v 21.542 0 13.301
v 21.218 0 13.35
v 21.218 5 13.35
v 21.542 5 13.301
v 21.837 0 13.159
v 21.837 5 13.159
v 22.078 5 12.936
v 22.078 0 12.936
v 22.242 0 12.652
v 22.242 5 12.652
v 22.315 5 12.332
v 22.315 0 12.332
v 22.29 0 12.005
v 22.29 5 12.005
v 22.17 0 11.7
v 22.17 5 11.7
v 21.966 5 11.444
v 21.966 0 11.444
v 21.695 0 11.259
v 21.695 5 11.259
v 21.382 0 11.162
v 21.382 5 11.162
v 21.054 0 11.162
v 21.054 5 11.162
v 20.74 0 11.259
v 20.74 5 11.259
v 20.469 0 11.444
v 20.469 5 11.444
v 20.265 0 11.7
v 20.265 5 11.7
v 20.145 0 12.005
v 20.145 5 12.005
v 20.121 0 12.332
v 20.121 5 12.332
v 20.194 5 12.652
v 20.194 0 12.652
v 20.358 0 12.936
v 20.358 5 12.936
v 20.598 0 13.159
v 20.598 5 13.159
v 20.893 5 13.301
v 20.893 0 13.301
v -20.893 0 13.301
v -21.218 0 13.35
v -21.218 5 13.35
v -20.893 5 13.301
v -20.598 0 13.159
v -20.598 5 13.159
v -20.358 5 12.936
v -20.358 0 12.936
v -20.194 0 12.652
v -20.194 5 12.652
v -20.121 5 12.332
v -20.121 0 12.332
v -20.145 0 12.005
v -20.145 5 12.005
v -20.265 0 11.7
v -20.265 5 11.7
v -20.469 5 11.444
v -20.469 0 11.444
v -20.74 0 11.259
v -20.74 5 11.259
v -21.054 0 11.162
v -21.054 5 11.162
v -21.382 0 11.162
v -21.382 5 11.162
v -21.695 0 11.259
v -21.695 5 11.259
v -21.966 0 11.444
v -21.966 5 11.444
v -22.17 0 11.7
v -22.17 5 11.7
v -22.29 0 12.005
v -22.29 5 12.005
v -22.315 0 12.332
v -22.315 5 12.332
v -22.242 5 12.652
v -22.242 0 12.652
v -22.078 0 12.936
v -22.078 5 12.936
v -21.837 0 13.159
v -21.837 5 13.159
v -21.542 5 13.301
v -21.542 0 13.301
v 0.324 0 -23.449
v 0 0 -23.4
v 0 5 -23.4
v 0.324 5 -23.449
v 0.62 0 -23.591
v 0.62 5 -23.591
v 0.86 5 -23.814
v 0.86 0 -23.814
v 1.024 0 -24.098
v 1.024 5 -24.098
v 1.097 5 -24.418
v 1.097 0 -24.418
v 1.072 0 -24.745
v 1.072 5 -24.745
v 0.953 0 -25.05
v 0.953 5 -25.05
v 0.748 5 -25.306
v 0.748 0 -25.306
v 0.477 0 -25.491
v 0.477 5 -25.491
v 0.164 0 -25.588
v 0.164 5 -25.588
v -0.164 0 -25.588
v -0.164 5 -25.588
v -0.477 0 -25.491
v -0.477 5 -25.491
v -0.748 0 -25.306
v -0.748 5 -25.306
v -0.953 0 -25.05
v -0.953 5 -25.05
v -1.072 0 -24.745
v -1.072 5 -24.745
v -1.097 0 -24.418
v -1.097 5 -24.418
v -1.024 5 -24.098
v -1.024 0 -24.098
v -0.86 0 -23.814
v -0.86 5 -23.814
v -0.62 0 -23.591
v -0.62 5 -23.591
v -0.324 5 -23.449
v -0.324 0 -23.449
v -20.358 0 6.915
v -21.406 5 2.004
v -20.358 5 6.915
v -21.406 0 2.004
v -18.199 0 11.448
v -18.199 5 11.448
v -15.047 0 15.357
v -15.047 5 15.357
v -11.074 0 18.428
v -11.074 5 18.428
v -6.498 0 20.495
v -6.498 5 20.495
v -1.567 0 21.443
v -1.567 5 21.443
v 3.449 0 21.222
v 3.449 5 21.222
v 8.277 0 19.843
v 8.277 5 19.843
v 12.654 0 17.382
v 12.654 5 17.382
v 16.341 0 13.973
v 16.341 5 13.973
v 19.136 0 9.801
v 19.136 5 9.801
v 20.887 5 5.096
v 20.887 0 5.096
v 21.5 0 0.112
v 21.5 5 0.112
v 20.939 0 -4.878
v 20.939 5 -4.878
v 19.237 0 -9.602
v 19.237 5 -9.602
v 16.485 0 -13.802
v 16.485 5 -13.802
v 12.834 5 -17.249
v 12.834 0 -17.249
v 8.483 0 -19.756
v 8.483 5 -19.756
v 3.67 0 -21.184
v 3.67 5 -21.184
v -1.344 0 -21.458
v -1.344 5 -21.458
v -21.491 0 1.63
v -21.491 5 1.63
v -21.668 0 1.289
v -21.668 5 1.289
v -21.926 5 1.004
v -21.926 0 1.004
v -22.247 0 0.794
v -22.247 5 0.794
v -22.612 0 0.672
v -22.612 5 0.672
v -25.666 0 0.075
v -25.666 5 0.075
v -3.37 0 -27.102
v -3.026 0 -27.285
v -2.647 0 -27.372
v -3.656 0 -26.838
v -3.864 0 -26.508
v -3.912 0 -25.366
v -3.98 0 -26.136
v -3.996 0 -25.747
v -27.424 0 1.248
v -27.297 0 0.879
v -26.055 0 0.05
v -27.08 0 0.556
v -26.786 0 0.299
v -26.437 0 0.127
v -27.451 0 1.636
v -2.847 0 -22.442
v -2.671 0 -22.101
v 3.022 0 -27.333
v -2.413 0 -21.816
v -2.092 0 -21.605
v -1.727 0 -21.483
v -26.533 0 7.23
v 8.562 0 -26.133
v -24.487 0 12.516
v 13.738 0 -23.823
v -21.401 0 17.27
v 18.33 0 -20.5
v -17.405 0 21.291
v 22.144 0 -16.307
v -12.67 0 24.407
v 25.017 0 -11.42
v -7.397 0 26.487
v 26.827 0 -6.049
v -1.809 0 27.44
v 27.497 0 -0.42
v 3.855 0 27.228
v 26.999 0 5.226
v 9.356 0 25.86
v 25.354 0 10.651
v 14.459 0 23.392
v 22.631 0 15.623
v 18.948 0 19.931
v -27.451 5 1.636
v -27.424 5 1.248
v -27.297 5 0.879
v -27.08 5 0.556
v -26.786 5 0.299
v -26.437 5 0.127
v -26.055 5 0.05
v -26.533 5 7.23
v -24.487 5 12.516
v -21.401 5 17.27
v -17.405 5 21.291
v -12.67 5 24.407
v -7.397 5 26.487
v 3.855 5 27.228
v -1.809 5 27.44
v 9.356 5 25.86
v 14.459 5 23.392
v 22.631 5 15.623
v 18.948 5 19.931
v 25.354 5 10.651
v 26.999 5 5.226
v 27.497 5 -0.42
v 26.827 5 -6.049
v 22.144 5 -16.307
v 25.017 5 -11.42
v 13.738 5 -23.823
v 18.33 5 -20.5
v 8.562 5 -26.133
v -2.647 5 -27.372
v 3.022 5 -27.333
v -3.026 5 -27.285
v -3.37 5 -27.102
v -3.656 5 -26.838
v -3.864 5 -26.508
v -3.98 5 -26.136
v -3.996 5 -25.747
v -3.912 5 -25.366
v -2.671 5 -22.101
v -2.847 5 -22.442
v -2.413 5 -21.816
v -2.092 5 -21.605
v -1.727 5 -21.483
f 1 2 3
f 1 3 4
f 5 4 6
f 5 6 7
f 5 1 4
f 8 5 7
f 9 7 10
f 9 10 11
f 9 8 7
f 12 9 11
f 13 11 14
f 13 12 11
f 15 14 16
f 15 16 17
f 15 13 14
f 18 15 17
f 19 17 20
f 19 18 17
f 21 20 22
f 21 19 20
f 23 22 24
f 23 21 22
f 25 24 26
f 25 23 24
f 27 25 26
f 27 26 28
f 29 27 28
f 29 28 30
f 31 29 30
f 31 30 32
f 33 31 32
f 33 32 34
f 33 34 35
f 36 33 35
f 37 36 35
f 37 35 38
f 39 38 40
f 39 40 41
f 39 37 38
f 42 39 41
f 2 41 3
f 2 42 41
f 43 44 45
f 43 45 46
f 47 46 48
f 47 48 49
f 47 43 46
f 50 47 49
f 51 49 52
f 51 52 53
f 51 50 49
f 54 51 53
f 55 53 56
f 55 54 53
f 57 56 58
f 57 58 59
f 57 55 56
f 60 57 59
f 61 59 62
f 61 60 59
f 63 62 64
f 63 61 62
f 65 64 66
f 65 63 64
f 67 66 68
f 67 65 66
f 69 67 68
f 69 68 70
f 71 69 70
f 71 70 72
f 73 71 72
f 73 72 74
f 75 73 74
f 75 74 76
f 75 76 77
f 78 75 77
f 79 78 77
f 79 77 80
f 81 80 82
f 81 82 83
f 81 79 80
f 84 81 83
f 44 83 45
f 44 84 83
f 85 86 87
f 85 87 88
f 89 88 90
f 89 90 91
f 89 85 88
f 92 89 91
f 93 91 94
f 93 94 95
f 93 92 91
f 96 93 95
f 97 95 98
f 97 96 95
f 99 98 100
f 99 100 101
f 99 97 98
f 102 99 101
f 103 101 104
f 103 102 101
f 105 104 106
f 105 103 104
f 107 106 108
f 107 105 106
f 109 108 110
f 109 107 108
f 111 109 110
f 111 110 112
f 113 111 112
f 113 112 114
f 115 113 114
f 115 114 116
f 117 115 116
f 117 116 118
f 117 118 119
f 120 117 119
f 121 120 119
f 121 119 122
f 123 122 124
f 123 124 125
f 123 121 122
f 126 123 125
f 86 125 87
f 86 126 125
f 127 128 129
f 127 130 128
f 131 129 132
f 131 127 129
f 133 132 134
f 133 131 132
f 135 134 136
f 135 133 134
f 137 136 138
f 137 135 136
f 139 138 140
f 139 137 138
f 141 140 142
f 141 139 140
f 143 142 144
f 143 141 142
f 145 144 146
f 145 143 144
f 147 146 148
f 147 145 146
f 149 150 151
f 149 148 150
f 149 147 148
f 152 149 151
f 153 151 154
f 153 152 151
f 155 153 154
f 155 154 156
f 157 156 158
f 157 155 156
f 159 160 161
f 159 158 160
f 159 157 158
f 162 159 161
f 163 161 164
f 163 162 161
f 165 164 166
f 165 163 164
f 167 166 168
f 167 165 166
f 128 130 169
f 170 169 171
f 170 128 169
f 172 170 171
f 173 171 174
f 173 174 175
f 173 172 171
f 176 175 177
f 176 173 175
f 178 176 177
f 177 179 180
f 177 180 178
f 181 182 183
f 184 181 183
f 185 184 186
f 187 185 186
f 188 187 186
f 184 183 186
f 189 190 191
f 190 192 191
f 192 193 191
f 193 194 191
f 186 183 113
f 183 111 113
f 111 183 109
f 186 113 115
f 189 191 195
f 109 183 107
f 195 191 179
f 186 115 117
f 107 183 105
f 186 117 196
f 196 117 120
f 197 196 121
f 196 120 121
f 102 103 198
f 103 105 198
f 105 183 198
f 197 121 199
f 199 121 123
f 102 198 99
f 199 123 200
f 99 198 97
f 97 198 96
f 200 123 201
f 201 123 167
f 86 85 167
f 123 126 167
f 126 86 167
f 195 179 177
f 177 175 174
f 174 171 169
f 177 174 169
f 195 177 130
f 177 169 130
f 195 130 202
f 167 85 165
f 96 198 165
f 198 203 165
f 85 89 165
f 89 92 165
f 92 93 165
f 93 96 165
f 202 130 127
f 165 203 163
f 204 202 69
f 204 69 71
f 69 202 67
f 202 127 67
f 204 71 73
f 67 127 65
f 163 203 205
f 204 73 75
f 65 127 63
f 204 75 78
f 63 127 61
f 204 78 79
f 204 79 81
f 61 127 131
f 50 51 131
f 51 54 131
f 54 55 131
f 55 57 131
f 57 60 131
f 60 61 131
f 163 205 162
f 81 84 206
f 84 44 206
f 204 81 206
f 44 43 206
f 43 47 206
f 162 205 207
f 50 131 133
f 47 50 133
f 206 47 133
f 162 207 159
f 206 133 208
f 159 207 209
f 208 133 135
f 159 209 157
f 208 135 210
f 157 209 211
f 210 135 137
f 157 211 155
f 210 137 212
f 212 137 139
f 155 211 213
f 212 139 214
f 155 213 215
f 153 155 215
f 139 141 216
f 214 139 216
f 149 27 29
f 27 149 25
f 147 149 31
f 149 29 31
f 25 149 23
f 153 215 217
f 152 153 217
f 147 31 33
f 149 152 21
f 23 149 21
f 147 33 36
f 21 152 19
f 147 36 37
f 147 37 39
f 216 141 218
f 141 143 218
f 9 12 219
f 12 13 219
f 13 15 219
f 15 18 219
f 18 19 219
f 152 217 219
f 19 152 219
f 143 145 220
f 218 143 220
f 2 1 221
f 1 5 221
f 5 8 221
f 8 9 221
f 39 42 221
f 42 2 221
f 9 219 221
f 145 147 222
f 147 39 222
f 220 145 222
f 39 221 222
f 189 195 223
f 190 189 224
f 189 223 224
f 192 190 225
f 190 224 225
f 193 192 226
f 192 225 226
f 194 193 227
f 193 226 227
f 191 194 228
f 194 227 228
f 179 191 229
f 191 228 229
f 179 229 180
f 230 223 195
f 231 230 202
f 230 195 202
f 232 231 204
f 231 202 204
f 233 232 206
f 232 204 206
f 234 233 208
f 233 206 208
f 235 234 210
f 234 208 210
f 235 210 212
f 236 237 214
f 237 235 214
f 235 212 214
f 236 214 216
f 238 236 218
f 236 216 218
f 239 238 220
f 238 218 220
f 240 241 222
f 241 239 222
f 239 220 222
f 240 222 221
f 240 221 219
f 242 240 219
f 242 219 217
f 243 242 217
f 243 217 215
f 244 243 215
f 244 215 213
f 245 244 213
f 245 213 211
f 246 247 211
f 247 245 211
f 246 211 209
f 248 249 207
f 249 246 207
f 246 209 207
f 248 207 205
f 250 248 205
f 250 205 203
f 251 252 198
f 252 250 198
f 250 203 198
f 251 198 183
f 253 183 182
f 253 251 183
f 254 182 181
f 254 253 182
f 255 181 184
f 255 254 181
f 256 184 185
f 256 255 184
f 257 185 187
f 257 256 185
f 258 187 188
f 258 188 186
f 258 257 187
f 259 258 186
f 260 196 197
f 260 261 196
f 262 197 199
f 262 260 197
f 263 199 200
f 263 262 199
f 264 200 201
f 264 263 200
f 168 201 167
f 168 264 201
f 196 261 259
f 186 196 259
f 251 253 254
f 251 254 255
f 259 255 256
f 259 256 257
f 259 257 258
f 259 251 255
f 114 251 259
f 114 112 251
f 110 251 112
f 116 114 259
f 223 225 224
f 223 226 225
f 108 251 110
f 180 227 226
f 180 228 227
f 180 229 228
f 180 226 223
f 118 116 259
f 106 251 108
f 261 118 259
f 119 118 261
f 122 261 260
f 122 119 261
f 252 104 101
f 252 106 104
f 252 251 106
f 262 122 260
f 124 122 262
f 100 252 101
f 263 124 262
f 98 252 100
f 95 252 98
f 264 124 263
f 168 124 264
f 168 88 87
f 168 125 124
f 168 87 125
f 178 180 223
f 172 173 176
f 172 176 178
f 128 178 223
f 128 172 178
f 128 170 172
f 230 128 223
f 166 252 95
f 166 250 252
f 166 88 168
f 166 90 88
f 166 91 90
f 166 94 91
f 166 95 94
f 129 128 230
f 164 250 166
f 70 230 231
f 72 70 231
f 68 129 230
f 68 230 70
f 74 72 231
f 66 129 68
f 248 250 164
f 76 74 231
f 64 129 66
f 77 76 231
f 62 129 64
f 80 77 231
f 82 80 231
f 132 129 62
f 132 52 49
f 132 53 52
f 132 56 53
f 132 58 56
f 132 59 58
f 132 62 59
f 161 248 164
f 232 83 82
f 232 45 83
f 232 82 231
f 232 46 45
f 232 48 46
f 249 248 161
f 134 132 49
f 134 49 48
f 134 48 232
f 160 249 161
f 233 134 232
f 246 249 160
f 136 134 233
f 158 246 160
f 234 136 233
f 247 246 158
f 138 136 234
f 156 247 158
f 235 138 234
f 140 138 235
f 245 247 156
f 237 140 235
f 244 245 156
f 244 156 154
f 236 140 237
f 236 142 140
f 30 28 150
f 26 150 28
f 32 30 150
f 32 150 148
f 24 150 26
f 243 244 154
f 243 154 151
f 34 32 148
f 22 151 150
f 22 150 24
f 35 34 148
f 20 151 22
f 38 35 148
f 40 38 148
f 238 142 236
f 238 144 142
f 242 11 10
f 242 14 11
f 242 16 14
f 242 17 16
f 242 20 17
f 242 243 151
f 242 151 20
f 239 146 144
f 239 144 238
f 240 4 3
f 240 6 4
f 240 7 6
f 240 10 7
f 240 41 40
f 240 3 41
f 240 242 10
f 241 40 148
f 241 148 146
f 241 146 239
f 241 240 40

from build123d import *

# Parameters (mm, degrees)
SKETCH_1_R          = 27.5
SKETCH_1_R_2        = 21.5
SKETCH_1_R_3        = 1.1
EXTRUDE_1_DEPTH     = 5
CUT_EXTRUDE_1_DEPTH = 5
FILLET_1_R          = 1.5


with BuildPart() as part:
    # 草图1 → 凸台-拉伸1 (new body)
    with BuildSketch(Plane(origin=(0, 0, 0), x_dir=(1, 0, 0), z_dir=(0, 1, 0))):
        with Locations(Location((0, 0, 0), (0, 0, 270))):
            Circle(SKETCH_1_R)
        with Locations(Location((0, 0, 0), (0, 0, 270))):
            Circle(SKETCH_1_R_2, mode=Mode.SUBTRACT)
        with Locations(Location((0, 24.5, 0), (0, 0, 270))):
            Circle(SKETCH_1_R_3, mode=Mode.SUBTRACT)
        with Locations(Location((21.217622393, -12.25, 0), (0, 0, 270))):
            Circle(SKETCH_1_R_3, mode=Mode.SUBTRACT)
        with Locations(Location((-21.217622393, -12.25, 0), (0, 0, 270))):
            Circle(SKETCH_1_R_3, mode=Mode.SUBTRACT)
    extrude(amount=EXTRUDE_1_DEPTH)

    # 草图2 → 切除-拉伸1 (cut)
    with BuildSketch(Plane.XZ):
        with BuildLine():
            Line((-2.453357197, -21.359565503), (-4.550320626, -27.120925172))
            ThreePointArc((-4.550320626, -27.120925172), (-20.900792824, -17.871957345), (-27.498537849, -0.283577443))
            Line((-27.498537849, -0.283577443), (-21.481435012, 0.89328037))
            ThreePointArc((-21.481435012, 0.89328037), (-16.340619844, -13.972621197), (-2.453357197, -21.359565503))
        make_face()
    extrude(amount=-CUT_EXTRUDE_1_DEPTH, mode=Mode.SUBTRACT)

    # 圆角1
    fillet_1_edges = [part.edges().sort_by_distance(p)[0] for p in [
        (-21.481435012, 2.5, 0.89328037),
        (-2.453357197, 2.5, -21.359565503),
        (-4.550320626, 2.5, -27.120925172),
        (-27.498537849, 2.5, -0.283577443),
    ]]
    fillet(fillet_1_edges, radius=FILLET_1_R)


solid = part.part
